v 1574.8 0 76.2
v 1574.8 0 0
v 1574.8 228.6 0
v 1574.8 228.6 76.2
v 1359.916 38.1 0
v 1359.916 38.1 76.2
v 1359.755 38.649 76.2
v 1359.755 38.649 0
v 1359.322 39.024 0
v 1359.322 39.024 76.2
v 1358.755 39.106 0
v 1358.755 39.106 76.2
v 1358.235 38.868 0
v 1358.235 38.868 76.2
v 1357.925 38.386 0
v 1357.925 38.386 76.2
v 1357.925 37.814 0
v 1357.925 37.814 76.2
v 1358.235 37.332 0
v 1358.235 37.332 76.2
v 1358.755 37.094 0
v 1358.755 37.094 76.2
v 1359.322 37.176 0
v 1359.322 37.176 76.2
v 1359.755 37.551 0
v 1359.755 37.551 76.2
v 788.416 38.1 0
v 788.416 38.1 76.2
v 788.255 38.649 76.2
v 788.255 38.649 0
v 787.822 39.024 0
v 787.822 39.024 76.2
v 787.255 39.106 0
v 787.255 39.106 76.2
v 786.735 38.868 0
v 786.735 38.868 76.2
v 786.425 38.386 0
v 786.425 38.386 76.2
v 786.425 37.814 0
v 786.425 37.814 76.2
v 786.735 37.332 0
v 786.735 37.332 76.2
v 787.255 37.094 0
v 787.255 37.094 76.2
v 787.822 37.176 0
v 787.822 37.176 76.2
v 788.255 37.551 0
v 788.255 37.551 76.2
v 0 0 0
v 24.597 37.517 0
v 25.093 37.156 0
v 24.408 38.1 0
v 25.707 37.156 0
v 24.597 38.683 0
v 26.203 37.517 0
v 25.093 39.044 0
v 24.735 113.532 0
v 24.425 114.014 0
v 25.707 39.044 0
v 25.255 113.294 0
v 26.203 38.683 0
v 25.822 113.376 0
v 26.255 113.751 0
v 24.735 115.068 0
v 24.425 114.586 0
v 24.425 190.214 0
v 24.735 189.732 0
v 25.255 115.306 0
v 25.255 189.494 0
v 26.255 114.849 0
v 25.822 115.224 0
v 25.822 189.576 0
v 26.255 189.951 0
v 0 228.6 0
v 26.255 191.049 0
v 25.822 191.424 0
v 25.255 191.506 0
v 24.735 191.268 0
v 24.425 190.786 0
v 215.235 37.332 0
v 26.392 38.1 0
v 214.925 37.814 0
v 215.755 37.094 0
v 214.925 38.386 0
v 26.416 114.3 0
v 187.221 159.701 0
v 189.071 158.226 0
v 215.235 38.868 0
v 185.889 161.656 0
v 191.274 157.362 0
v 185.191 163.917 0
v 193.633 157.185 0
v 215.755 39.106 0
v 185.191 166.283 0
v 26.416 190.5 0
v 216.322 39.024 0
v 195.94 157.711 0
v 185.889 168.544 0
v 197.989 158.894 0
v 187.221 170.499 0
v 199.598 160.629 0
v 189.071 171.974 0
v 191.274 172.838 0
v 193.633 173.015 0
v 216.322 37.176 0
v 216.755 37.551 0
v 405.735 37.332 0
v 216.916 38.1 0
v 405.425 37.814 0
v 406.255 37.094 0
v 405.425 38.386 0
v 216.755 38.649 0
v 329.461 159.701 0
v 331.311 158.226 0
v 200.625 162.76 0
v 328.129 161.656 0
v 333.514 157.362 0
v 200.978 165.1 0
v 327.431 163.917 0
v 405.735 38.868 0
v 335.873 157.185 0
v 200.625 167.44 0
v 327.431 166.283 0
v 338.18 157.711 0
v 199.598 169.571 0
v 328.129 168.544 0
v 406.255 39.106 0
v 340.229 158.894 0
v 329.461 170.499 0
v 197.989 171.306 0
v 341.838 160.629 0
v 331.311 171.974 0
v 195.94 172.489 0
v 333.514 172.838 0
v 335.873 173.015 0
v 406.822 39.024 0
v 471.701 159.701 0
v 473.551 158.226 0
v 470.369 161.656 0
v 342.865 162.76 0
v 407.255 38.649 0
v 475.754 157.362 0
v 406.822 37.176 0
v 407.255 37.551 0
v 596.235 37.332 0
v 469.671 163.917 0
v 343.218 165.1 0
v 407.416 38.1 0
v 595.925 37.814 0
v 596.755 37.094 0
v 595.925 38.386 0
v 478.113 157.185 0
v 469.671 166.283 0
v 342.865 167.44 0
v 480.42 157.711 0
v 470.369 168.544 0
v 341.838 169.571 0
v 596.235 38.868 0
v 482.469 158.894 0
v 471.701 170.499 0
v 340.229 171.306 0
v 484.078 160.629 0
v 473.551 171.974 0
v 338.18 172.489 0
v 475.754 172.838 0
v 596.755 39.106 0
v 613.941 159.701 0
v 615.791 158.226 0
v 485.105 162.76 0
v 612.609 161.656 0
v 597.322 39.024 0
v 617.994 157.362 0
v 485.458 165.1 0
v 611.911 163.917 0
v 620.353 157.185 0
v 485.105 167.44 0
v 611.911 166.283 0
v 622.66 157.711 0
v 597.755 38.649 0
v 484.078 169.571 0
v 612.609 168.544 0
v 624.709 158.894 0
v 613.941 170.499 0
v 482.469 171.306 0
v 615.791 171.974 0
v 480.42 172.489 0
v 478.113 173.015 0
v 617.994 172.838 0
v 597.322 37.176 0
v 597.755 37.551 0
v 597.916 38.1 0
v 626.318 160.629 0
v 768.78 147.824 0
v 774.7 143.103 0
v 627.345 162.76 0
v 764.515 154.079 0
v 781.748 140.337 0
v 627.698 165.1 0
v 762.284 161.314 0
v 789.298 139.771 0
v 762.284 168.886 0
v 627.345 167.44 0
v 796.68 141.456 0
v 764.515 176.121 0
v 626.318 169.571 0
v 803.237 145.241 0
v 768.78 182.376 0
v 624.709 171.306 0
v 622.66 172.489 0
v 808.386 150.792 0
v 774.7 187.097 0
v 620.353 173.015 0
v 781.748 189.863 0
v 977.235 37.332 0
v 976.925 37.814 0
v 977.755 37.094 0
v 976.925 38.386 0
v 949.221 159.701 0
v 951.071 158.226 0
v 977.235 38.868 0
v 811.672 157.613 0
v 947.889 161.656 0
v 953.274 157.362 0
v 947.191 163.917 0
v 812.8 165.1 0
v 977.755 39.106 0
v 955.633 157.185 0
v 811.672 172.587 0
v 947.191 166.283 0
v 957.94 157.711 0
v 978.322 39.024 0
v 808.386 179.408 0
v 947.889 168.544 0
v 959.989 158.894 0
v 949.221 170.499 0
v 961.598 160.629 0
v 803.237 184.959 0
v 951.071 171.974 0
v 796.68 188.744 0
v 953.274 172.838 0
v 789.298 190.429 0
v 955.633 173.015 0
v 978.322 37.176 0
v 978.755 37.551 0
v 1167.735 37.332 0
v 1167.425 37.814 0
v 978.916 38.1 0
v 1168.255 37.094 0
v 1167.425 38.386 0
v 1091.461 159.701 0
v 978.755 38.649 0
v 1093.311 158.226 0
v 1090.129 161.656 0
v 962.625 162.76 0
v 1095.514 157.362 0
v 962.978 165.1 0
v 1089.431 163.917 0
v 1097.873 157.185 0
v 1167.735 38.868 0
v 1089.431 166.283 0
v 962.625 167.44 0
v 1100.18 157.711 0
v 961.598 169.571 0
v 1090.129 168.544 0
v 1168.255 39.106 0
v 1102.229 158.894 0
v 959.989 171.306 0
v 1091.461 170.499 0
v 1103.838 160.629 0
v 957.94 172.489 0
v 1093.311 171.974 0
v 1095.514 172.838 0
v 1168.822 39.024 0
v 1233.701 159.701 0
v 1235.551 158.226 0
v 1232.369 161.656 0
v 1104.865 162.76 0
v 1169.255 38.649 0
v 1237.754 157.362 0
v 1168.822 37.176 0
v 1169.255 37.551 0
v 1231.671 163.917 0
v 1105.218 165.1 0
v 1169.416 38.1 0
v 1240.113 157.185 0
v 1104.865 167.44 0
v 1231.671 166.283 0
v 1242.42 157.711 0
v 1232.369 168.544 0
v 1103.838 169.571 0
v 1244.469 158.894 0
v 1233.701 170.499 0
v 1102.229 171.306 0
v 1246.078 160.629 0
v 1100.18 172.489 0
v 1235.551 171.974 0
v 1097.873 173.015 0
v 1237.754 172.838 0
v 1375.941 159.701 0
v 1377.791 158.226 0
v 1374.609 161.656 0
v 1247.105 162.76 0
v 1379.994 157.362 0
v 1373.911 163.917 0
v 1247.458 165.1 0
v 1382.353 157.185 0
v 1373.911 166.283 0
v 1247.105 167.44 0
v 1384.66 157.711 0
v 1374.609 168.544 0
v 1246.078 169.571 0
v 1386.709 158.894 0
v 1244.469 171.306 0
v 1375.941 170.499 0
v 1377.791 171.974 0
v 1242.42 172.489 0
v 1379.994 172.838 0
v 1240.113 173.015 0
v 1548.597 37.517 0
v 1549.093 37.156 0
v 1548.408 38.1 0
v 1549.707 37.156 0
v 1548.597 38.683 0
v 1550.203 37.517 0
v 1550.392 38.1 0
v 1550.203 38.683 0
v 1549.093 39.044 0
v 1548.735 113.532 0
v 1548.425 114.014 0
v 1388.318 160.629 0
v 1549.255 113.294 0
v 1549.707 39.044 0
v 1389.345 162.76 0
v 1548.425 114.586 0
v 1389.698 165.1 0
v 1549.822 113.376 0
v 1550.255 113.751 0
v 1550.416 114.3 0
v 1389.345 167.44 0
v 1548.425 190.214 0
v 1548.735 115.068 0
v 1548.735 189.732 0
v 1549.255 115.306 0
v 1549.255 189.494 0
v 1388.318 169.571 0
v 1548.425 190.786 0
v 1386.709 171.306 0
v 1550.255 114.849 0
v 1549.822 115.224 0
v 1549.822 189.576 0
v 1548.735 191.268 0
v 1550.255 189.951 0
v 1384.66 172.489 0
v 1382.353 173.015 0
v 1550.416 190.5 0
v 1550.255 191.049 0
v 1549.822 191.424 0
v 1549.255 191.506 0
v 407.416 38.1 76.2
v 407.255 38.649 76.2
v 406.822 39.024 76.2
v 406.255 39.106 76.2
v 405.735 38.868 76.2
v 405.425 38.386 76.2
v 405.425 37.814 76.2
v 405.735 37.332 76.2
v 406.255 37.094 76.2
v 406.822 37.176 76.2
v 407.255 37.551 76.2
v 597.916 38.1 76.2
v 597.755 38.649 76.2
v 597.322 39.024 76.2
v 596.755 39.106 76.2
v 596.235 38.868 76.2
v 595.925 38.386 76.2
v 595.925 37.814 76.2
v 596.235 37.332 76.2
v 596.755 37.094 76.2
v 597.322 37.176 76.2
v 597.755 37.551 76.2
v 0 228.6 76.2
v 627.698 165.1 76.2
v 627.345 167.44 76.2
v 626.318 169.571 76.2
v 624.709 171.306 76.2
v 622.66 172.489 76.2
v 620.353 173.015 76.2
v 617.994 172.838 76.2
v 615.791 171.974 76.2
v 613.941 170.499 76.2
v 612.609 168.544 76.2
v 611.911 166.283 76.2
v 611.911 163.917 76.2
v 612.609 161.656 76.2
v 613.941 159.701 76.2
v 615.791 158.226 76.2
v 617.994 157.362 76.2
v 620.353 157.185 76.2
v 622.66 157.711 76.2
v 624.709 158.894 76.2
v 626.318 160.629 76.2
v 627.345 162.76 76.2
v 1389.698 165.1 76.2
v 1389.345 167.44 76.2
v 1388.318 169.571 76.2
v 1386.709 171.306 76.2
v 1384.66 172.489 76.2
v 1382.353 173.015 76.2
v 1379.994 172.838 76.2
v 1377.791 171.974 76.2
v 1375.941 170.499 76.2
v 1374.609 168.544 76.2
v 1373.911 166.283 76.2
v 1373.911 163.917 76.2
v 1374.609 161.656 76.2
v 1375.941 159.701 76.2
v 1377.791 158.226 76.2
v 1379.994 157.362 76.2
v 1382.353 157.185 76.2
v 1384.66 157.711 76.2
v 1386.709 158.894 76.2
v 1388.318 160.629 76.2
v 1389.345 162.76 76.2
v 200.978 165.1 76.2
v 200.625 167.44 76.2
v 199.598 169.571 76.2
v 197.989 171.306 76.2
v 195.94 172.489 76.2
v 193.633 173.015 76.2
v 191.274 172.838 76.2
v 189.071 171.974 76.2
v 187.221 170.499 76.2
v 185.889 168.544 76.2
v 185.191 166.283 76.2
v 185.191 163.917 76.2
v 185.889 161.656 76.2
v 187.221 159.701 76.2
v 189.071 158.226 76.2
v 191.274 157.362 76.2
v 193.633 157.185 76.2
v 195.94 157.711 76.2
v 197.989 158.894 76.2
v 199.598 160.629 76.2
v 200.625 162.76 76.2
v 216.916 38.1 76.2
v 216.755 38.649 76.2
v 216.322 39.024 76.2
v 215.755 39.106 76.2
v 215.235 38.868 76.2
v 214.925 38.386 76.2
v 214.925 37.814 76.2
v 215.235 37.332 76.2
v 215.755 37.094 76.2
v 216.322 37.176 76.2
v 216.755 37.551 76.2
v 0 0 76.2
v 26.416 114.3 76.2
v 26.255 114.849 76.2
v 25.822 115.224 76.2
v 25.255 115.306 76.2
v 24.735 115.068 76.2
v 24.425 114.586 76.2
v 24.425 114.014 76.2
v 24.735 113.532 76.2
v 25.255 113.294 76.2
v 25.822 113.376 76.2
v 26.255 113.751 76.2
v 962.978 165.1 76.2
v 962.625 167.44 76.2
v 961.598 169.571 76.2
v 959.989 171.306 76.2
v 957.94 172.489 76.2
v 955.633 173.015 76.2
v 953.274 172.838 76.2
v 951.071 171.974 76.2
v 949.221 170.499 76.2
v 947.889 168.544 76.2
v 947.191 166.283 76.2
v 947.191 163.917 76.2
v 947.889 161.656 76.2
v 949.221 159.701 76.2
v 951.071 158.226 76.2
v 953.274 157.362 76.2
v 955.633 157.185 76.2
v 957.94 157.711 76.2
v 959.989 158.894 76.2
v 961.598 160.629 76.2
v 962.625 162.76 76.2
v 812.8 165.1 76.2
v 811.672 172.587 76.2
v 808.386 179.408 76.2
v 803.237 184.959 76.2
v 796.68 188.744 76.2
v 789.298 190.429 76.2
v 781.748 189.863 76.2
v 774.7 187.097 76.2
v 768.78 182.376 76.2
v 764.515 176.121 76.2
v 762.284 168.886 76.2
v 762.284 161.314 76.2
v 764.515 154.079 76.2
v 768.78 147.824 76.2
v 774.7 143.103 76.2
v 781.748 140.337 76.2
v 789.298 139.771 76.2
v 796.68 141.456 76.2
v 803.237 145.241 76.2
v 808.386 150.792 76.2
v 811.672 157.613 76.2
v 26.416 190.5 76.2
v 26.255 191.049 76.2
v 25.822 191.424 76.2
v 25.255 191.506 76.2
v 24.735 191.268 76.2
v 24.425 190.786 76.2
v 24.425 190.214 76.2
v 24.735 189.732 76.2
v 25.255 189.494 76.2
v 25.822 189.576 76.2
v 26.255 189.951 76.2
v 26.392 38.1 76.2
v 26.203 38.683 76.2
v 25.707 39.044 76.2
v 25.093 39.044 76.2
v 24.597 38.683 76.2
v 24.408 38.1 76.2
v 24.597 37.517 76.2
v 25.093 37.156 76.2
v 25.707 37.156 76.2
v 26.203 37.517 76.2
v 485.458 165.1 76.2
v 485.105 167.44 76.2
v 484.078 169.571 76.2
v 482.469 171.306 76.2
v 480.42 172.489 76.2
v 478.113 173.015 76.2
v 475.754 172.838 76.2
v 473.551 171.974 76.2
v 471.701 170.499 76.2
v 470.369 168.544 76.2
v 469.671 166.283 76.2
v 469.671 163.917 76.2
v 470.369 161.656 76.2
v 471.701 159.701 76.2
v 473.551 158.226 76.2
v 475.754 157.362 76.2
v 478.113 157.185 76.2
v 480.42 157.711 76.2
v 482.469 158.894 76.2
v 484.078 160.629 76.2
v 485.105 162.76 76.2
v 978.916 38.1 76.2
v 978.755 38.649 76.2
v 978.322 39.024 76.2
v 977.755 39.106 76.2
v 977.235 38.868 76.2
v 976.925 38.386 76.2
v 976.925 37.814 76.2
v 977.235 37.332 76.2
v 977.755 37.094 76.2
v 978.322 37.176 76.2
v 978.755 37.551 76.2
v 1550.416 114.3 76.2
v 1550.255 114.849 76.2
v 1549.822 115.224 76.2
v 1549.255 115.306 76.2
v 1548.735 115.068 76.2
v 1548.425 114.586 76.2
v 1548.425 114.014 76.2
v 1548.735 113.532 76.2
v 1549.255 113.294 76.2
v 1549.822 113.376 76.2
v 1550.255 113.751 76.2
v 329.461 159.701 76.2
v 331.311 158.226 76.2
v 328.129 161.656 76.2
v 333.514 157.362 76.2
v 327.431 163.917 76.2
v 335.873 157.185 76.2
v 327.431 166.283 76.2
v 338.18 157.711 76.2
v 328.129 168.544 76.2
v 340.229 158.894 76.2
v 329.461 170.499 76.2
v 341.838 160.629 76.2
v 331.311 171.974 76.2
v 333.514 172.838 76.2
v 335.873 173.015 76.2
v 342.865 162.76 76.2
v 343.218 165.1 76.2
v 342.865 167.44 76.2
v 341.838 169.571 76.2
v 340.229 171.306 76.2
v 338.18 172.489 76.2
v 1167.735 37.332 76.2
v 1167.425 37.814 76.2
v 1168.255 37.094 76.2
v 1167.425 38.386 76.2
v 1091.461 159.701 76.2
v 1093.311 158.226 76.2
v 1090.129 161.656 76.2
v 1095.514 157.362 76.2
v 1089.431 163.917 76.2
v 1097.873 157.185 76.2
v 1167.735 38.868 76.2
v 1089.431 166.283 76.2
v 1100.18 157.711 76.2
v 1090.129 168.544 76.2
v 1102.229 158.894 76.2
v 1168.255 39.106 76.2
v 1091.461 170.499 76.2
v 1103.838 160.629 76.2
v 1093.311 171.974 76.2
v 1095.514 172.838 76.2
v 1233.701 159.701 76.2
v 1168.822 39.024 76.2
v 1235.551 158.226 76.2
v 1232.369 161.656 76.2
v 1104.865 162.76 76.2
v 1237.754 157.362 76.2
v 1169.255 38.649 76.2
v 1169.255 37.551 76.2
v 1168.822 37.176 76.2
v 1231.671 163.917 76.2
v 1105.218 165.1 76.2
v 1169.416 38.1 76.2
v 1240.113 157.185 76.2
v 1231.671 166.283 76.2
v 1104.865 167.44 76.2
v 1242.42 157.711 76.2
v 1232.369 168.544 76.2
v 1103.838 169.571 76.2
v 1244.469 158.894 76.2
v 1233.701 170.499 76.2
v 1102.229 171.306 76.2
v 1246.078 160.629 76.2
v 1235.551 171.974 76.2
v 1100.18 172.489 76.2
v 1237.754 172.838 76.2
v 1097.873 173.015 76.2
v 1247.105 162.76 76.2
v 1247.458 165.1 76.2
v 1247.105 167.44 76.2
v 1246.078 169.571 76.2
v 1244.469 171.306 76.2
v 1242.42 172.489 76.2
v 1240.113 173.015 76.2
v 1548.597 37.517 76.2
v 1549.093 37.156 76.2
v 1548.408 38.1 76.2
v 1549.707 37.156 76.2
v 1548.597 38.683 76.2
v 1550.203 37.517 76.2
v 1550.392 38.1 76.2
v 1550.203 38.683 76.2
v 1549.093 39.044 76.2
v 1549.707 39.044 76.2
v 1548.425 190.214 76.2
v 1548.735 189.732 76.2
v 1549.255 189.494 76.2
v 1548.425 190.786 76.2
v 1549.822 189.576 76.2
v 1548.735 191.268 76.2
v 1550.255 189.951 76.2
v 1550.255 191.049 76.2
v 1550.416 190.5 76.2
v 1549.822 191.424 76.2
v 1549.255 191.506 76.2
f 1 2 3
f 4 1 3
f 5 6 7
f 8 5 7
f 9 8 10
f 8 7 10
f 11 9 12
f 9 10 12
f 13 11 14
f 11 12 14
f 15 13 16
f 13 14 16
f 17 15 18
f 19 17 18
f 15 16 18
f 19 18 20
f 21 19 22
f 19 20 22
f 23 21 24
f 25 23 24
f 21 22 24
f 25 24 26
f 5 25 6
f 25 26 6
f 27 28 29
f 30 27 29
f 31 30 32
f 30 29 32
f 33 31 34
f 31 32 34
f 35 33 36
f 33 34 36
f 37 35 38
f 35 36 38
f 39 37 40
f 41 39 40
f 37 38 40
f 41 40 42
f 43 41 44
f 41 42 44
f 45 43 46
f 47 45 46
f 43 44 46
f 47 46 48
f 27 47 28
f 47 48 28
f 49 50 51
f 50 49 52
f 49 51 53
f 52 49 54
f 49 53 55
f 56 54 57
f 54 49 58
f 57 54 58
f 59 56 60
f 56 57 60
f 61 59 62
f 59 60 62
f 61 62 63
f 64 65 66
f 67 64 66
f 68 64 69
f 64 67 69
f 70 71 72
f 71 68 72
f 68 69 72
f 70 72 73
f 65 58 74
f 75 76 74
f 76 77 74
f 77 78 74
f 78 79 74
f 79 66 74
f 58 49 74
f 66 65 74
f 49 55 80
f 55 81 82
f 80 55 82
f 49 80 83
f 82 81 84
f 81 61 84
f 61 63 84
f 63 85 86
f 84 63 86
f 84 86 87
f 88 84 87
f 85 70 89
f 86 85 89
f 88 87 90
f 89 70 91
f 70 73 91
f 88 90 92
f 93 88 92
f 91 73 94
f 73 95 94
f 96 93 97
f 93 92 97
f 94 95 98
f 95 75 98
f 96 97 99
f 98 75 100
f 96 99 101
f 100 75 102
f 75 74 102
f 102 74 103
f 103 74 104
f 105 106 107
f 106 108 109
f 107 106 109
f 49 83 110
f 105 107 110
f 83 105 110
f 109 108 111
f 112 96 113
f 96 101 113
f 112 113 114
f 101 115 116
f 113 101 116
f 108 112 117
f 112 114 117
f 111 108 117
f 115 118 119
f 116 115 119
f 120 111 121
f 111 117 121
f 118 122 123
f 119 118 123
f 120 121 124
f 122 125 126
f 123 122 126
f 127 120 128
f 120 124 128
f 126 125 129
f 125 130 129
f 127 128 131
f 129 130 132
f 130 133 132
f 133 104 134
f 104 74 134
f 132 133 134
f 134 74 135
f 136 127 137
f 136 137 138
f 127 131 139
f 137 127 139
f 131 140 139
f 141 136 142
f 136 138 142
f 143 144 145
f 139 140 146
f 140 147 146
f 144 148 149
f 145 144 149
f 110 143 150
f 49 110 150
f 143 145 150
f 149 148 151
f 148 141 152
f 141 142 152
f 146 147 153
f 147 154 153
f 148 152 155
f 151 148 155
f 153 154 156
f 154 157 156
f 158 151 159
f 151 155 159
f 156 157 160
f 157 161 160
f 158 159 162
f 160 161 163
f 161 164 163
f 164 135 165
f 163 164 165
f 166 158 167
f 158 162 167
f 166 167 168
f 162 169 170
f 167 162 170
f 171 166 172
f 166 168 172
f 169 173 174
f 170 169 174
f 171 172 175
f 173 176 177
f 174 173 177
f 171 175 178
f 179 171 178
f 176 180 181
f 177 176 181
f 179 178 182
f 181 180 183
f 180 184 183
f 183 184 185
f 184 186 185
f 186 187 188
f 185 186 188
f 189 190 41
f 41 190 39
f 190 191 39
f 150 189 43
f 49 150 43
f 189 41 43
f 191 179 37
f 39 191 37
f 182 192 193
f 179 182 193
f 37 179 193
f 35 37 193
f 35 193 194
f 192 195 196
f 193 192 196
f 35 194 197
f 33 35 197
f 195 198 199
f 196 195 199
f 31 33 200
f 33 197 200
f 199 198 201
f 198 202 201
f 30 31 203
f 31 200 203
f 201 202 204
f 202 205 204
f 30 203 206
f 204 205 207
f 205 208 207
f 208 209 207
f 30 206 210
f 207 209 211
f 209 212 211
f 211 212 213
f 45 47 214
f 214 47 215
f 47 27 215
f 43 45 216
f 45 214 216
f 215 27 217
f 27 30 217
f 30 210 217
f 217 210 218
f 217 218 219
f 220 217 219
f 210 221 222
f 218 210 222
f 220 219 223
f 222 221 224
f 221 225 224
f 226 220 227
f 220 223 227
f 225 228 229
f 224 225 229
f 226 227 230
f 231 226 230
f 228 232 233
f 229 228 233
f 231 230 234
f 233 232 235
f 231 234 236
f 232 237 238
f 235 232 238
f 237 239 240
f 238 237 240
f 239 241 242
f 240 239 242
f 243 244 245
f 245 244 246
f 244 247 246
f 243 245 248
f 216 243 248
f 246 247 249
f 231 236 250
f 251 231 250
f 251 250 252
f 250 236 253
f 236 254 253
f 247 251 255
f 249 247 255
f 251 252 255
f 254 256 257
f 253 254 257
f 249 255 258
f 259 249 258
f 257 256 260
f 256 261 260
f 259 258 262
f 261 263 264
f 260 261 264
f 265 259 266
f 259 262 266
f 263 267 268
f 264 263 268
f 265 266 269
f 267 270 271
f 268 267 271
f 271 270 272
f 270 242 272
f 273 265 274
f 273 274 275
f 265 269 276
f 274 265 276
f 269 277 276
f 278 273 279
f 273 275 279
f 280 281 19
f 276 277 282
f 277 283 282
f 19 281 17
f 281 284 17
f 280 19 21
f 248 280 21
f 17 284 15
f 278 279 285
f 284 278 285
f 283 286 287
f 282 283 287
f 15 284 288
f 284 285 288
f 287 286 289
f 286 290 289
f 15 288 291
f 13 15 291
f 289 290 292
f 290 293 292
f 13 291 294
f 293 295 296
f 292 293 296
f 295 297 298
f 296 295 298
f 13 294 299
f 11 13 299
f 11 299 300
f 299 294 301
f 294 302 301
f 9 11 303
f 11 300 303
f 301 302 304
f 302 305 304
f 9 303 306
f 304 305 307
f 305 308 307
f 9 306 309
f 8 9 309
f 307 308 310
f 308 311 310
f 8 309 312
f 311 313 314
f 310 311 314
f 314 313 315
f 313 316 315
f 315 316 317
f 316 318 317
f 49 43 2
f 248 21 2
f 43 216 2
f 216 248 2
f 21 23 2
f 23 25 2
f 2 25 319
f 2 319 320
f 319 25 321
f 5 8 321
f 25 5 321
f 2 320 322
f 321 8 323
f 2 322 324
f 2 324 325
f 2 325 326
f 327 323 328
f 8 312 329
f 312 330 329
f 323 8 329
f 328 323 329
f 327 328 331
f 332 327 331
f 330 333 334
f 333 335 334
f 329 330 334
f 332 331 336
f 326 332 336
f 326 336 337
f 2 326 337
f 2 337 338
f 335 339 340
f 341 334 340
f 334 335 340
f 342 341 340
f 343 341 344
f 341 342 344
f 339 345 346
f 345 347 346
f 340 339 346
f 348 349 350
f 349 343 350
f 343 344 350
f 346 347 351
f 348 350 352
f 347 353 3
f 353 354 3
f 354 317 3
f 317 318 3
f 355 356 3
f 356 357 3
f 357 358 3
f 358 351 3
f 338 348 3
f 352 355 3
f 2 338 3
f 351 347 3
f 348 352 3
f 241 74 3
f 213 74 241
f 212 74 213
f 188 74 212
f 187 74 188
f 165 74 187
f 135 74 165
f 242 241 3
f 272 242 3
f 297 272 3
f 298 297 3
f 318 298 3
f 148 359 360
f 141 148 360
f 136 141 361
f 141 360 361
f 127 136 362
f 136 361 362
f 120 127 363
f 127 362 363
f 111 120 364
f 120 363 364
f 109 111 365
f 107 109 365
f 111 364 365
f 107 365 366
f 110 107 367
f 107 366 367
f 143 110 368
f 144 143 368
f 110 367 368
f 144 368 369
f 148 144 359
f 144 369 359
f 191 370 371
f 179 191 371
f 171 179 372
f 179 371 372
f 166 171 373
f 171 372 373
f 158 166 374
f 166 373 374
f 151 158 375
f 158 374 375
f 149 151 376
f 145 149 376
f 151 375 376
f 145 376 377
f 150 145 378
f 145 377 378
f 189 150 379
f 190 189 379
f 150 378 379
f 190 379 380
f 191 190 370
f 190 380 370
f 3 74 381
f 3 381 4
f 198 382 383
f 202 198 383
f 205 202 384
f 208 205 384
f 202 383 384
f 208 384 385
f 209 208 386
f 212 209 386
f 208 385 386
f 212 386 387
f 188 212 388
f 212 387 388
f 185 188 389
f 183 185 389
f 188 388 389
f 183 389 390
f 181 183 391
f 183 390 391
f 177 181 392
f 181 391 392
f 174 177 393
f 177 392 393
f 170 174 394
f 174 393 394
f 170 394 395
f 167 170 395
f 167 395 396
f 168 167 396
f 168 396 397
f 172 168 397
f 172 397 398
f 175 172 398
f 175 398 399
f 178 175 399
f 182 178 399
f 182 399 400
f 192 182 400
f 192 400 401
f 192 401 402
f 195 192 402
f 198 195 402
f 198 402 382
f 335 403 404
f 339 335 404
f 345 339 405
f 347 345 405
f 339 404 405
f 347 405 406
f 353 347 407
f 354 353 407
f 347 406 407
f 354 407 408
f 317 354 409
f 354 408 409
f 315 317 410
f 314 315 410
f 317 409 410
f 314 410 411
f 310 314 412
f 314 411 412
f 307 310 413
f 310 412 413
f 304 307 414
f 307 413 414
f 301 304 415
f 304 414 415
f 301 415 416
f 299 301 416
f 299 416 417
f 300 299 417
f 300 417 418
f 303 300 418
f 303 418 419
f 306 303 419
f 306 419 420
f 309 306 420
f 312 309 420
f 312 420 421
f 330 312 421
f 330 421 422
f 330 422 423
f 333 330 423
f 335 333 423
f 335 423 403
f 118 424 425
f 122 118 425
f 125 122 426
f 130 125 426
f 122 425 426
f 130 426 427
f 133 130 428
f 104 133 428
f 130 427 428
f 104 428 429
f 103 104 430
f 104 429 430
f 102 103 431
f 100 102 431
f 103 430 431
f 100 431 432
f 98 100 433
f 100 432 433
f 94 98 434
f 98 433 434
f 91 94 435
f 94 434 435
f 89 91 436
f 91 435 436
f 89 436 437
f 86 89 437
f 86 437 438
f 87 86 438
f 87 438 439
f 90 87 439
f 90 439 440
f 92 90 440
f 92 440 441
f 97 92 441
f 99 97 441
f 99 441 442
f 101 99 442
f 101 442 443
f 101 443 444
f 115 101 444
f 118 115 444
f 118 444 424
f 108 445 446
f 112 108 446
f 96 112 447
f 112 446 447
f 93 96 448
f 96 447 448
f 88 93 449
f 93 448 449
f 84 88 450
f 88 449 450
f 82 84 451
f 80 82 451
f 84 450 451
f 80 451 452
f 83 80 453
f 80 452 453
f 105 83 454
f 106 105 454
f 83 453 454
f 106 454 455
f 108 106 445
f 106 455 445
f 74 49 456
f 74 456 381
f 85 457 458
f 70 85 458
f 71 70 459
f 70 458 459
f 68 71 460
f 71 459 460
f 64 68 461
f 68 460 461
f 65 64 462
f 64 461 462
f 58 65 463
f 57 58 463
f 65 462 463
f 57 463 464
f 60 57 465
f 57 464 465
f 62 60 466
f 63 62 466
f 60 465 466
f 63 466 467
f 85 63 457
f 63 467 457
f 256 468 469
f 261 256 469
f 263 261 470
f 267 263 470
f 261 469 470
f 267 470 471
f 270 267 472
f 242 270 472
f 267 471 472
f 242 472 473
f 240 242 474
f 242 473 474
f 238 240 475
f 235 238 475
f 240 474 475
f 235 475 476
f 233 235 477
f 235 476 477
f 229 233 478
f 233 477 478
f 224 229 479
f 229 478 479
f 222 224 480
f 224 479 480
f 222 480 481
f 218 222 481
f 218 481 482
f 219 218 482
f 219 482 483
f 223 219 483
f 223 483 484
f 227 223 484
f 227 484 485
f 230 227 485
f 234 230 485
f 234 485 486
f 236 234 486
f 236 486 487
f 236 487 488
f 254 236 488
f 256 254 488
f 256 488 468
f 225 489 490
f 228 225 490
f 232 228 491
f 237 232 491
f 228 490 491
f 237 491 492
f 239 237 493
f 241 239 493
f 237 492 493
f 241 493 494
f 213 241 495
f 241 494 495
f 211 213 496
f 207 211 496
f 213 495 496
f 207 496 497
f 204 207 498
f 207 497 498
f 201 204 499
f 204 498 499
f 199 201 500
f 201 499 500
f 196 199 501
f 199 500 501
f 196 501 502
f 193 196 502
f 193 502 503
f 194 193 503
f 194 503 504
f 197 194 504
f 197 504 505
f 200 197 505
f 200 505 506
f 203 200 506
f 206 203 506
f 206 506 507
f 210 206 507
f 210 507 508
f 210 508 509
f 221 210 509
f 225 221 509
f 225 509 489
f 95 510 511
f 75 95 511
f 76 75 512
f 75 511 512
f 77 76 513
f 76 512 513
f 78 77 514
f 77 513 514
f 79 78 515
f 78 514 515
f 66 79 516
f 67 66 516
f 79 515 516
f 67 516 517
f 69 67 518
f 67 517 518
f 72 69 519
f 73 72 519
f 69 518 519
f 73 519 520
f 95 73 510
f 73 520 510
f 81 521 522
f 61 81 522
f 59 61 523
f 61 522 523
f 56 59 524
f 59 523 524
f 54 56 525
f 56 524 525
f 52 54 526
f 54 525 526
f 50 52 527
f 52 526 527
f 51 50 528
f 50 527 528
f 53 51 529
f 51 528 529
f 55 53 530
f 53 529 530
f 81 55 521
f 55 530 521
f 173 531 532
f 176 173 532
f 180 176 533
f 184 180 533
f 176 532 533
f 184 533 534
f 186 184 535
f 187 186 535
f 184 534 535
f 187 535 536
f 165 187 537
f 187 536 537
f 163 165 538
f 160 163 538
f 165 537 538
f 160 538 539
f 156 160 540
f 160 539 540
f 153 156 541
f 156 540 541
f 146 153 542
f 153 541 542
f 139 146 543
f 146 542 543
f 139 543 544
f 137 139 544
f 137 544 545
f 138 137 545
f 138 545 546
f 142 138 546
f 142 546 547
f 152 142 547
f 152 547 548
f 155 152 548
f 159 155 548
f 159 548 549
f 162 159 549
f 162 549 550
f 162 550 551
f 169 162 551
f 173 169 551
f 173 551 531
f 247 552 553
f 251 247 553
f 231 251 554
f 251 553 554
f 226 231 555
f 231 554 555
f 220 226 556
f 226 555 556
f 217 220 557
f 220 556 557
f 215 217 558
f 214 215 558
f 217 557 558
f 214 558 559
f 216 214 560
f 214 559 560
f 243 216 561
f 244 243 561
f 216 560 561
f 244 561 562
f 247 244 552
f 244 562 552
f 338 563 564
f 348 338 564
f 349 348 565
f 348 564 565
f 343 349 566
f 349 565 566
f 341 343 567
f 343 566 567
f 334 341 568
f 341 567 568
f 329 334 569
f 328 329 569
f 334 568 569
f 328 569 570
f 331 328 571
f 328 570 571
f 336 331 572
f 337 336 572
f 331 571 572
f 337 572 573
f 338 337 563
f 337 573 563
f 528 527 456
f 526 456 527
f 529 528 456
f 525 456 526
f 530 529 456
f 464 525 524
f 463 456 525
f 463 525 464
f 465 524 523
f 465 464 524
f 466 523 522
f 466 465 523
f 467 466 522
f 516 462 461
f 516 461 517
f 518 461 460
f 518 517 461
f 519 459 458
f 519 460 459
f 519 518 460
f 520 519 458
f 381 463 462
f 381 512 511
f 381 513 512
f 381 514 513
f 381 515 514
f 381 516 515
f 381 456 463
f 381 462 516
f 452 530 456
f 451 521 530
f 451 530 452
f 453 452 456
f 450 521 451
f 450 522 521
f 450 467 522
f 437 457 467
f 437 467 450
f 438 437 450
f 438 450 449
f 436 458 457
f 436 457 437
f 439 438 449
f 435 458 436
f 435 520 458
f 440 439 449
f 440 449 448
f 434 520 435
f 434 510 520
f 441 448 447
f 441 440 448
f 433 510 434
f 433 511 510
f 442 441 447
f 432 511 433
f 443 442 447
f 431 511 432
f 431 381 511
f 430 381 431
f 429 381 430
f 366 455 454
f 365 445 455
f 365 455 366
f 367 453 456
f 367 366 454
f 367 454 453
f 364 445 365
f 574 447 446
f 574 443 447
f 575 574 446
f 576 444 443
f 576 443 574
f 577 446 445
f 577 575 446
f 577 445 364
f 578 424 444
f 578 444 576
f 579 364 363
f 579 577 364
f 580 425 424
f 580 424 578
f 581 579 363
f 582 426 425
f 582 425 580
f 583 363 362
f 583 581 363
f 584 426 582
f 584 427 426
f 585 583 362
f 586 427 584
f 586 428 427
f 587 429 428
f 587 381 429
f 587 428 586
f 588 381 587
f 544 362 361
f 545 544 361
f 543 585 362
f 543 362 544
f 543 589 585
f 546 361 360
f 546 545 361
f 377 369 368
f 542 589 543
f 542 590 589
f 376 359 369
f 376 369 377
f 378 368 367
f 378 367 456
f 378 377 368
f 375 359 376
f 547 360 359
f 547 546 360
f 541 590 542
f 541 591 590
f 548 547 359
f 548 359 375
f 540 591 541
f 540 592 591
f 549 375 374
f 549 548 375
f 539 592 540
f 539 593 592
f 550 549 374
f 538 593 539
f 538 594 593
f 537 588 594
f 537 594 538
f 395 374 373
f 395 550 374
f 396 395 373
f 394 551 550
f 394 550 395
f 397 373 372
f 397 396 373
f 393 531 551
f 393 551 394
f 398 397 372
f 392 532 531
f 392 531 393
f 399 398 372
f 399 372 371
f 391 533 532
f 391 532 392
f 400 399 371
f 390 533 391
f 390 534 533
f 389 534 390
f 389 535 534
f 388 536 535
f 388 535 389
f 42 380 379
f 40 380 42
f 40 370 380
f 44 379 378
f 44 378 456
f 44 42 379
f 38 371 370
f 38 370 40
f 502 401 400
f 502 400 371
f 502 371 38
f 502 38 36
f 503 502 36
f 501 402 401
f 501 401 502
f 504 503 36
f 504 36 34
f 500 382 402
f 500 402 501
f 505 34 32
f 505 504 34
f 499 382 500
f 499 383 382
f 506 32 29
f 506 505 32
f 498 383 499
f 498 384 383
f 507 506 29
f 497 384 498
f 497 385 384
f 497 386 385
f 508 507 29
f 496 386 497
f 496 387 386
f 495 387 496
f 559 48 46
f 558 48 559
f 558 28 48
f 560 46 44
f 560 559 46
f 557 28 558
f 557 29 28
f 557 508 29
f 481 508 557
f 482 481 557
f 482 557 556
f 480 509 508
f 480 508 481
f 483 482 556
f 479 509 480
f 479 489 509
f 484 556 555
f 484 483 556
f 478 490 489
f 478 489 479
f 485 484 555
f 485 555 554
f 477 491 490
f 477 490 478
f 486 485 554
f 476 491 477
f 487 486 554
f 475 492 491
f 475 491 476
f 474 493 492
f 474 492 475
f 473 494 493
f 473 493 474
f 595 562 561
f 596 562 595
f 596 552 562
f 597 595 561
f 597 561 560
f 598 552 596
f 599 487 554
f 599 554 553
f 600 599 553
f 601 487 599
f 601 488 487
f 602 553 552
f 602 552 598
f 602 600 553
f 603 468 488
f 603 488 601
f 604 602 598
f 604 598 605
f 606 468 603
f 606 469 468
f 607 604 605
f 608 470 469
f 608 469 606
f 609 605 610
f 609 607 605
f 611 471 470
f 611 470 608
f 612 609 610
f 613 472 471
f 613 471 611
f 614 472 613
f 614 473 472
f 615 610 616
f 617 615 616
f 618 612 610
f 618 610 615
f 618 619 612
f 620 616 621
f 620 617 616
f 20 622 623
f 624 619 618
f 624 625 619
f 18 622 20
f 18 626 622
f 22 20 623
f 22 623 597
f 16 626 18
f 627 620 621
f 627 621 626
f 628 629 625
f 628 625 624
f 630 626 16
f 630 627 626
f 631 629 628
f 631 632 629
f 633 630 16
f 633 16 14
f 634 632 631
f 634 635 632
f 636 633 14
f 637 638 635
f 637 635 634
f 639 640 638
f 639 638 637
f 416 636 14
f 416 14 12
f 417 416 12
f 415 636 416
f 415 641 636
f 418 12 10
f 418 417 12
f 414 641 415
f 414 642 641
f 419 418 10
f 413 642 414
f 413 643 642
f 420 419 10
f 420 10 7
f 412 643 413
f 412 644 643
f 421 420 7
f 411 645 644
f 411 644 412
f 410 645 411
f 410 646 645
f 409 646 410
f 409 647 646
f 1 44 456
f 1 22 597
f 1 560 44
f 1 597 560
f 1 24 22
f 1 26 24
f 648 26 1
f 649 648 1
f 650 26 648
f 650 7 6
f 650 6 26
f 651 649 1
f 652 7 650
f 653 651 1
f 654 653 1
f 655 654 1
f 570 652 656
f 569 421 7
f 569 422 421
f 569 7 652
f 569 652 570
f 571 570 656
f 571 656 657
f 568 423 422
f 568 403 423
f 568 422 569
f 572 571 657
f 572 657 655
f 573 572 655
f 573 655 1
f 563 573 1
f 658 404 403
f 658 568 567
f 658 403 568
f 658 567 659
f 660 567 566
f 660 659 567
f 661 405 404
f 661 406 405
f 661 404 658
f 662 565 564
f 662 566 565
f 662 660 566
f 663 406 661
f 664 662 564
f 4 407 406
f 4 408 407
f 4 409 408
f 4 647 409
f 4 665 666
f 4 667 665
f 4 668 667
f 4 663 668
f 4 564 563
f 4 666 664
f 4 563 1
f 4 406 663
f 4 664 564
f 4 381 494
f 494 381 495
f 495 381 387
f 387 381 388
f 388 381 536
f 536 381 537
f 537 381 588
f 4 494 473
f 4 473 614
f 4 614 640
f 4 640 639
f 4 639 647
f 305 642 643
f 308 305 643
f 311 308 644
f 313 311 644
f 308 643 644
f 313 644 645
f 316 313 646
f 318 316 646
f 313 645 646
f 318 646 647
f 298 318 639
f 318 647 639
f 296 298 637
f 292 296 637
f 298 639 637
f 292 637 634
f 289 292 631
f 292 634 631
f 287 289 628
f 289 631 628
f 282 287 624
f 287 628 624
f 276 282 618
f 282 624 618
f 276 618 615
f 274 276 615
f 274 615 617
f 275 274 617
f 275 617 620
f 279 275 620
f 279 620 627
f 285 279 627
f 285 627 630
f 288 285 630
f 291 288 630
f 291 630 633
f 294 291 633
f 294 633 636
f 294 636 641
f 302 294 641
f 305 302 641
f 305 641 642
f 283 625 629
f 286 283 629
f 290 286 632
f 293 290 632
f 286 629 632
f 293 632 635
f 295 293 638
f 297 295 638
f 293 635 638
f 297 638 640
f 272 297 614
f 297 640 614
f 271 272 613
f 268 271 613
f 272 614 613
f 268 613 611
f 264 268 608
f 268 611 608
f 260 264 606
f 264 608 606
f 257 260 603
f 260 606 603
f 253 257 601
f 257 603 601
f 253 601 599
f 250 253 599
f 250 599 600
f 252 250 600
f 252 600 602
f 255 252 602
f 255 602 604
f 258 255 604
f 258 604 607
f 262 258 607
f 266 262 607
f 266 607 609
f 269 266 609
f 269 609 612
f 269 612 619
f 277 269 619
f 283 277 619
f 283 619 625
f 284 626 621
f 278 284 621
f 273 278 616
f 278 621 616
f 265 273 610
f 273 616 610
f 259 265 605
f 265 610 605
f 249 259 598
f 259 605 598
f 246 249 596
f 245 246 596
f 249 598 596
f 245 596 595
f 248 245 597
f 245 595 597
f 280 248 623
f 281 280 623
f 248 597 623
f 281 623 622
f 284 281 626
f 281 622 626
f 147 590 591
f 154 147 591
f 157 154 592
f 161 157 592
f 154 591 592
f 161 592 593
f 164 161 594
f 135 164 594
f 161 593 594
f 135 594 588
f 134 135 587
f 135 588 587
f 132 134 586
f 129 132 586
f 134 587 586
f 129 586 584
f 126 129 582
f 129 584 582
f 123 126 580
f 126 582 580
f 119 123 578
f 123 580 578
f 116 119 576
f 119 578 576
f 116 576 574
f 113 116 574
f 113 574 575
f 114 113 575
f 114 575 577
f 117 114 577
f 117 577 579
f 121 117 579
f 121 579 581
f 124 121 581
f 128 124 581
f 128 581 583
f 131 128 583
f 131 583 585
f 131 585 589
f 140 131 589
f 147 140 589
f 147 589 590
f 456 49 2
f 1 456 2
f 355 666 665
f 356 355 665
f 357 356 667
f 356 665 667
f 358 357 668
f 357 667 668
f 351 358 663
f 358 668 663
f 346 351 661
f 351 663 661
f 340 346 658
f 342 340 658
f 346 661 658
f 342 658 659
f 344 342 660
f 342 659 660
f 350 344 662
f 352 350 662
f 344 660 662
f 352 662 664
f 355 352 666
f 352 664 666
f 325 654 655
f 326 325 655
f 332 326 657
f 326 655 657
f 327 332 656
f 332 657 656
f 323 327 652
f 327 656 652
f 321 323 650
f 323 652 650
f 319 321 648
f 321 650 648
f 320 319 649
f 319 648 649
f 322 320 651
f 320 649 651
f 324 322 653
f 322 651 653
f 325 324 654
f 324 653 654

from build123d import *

# Parameters (mm, degrees)
SKETCH1_W           = 1574.8
SKETCH1_H           = 228.6
BOSS_EXTRUDE1_DEPTH = 76.2
SKETCH2_R           = 7.9375
CUT_EXTRUDE1_DEPTH  = 1594.128820906
SKETCH3_R           = 0.9921875
SKETCH3_R_2         = 1.016
CUT_EXTRUDE2_DEPTH  = 76.2
SKETCH4_R           = 25.4
CUT_EXTRUDE3_DEPTH  = 1594.128820906


with BuildPart() as part:
    # Sketch1 → Boss-Extrude1 (new body)
    with BuildSketch(Plane.XY):
        with Locations((787.4, 114.3)):
            Rectangle(SKETCH1_W, SKETCH1_H)
    extrude(amount=BOSS_EXTRUDE1_DEPTH)

    # Sketch2 → Cut-Extrude1 (cut, through all)
    with BuildSketch(Plane.XY.offset(76.2)):
        with Locations((193.04, 165.1)):
            Circle(SKETCH2_R)
        with Locations((335.28, 165.1)):
            Circle(SKETCH2_R)
        with Locations((477.52, 165.1)):
            Circle(SKETCH2_R)
        with Locations((619.76, 165.1)):
            Circle(SKETCH2_R)
        with Locations((955.04, 165.1)):
            Circle(SKETCH2_R)
        with Locations((1097.28, 165.1)):
            Circle(SKETCH2_R)
        with Locations((1239.52, 165.1)):
            Circle(SKETCH2_R)
        with Locations((1381.76, 165.1)):
            Circle(SKETCH2_R)
    extrude(amount=-CUT_EXTRUDE1_DEPTH, mode=Mode.SUBTRACT)

    # Sketch3 → Cut-Extrude2 (cut)
    with BuildSketch(Plane.XY.offset(76.2)):
        with Locations((1549.4, 38.1)):
            Circle(SKETCH3_R)
        with Locations((1549.4, 190.5)):
            Circle(SKETCH3_R_2)
        with Locations((1549.4, 114.3)):
            Circle(SKETCH3_R_2)
        with Locations((25.4, 38.1)):
            Circle(SKETCH3_R)
        with Locations((25.4, 114.3)):
            Circle(SKETCH3_R_2)
        with Locations((25.4, 190.5)):
            Circle(SKETCH3_R_2)
        with Locations((215.9, 38.1)):
            Circle(SKETCH3_R_2)
        with Locations((406.4, 38.1)):
            Circle(SKETCH3_R_2)
        with Locations((596.9, 38.1)):
            Circle(SKETCH3_R_2)
        with Locations((787.4, 38.1)):
            Circle(SKETCH3_R_2)
        with Locations((977.9, 38.1)):
            Circle(SKETCH3_R_2)
        with Locations((1168.4, 38.1)):
            Circle(SKETCH3_R_2)
        with Locations((1358.9, 38.1)):
            Circle(SKETCH3_R_2)
    extrude(amount=-CUT_EXTRUDE2_DEPTH, mode=Mode.SUBTRACT)

    # Sketch4 → Cut-Extrude3 (cut, through all)
    with BuildSketch(Plane.XY.offset(76.2)):
        with Locations((787.4, 165.1)):
            Circle(SKETCH4_R)
    extrude(amount=-CUT_EXTRUDE3_DEPTH, mode=Mode.SUBTRACT)


solid = part.part
